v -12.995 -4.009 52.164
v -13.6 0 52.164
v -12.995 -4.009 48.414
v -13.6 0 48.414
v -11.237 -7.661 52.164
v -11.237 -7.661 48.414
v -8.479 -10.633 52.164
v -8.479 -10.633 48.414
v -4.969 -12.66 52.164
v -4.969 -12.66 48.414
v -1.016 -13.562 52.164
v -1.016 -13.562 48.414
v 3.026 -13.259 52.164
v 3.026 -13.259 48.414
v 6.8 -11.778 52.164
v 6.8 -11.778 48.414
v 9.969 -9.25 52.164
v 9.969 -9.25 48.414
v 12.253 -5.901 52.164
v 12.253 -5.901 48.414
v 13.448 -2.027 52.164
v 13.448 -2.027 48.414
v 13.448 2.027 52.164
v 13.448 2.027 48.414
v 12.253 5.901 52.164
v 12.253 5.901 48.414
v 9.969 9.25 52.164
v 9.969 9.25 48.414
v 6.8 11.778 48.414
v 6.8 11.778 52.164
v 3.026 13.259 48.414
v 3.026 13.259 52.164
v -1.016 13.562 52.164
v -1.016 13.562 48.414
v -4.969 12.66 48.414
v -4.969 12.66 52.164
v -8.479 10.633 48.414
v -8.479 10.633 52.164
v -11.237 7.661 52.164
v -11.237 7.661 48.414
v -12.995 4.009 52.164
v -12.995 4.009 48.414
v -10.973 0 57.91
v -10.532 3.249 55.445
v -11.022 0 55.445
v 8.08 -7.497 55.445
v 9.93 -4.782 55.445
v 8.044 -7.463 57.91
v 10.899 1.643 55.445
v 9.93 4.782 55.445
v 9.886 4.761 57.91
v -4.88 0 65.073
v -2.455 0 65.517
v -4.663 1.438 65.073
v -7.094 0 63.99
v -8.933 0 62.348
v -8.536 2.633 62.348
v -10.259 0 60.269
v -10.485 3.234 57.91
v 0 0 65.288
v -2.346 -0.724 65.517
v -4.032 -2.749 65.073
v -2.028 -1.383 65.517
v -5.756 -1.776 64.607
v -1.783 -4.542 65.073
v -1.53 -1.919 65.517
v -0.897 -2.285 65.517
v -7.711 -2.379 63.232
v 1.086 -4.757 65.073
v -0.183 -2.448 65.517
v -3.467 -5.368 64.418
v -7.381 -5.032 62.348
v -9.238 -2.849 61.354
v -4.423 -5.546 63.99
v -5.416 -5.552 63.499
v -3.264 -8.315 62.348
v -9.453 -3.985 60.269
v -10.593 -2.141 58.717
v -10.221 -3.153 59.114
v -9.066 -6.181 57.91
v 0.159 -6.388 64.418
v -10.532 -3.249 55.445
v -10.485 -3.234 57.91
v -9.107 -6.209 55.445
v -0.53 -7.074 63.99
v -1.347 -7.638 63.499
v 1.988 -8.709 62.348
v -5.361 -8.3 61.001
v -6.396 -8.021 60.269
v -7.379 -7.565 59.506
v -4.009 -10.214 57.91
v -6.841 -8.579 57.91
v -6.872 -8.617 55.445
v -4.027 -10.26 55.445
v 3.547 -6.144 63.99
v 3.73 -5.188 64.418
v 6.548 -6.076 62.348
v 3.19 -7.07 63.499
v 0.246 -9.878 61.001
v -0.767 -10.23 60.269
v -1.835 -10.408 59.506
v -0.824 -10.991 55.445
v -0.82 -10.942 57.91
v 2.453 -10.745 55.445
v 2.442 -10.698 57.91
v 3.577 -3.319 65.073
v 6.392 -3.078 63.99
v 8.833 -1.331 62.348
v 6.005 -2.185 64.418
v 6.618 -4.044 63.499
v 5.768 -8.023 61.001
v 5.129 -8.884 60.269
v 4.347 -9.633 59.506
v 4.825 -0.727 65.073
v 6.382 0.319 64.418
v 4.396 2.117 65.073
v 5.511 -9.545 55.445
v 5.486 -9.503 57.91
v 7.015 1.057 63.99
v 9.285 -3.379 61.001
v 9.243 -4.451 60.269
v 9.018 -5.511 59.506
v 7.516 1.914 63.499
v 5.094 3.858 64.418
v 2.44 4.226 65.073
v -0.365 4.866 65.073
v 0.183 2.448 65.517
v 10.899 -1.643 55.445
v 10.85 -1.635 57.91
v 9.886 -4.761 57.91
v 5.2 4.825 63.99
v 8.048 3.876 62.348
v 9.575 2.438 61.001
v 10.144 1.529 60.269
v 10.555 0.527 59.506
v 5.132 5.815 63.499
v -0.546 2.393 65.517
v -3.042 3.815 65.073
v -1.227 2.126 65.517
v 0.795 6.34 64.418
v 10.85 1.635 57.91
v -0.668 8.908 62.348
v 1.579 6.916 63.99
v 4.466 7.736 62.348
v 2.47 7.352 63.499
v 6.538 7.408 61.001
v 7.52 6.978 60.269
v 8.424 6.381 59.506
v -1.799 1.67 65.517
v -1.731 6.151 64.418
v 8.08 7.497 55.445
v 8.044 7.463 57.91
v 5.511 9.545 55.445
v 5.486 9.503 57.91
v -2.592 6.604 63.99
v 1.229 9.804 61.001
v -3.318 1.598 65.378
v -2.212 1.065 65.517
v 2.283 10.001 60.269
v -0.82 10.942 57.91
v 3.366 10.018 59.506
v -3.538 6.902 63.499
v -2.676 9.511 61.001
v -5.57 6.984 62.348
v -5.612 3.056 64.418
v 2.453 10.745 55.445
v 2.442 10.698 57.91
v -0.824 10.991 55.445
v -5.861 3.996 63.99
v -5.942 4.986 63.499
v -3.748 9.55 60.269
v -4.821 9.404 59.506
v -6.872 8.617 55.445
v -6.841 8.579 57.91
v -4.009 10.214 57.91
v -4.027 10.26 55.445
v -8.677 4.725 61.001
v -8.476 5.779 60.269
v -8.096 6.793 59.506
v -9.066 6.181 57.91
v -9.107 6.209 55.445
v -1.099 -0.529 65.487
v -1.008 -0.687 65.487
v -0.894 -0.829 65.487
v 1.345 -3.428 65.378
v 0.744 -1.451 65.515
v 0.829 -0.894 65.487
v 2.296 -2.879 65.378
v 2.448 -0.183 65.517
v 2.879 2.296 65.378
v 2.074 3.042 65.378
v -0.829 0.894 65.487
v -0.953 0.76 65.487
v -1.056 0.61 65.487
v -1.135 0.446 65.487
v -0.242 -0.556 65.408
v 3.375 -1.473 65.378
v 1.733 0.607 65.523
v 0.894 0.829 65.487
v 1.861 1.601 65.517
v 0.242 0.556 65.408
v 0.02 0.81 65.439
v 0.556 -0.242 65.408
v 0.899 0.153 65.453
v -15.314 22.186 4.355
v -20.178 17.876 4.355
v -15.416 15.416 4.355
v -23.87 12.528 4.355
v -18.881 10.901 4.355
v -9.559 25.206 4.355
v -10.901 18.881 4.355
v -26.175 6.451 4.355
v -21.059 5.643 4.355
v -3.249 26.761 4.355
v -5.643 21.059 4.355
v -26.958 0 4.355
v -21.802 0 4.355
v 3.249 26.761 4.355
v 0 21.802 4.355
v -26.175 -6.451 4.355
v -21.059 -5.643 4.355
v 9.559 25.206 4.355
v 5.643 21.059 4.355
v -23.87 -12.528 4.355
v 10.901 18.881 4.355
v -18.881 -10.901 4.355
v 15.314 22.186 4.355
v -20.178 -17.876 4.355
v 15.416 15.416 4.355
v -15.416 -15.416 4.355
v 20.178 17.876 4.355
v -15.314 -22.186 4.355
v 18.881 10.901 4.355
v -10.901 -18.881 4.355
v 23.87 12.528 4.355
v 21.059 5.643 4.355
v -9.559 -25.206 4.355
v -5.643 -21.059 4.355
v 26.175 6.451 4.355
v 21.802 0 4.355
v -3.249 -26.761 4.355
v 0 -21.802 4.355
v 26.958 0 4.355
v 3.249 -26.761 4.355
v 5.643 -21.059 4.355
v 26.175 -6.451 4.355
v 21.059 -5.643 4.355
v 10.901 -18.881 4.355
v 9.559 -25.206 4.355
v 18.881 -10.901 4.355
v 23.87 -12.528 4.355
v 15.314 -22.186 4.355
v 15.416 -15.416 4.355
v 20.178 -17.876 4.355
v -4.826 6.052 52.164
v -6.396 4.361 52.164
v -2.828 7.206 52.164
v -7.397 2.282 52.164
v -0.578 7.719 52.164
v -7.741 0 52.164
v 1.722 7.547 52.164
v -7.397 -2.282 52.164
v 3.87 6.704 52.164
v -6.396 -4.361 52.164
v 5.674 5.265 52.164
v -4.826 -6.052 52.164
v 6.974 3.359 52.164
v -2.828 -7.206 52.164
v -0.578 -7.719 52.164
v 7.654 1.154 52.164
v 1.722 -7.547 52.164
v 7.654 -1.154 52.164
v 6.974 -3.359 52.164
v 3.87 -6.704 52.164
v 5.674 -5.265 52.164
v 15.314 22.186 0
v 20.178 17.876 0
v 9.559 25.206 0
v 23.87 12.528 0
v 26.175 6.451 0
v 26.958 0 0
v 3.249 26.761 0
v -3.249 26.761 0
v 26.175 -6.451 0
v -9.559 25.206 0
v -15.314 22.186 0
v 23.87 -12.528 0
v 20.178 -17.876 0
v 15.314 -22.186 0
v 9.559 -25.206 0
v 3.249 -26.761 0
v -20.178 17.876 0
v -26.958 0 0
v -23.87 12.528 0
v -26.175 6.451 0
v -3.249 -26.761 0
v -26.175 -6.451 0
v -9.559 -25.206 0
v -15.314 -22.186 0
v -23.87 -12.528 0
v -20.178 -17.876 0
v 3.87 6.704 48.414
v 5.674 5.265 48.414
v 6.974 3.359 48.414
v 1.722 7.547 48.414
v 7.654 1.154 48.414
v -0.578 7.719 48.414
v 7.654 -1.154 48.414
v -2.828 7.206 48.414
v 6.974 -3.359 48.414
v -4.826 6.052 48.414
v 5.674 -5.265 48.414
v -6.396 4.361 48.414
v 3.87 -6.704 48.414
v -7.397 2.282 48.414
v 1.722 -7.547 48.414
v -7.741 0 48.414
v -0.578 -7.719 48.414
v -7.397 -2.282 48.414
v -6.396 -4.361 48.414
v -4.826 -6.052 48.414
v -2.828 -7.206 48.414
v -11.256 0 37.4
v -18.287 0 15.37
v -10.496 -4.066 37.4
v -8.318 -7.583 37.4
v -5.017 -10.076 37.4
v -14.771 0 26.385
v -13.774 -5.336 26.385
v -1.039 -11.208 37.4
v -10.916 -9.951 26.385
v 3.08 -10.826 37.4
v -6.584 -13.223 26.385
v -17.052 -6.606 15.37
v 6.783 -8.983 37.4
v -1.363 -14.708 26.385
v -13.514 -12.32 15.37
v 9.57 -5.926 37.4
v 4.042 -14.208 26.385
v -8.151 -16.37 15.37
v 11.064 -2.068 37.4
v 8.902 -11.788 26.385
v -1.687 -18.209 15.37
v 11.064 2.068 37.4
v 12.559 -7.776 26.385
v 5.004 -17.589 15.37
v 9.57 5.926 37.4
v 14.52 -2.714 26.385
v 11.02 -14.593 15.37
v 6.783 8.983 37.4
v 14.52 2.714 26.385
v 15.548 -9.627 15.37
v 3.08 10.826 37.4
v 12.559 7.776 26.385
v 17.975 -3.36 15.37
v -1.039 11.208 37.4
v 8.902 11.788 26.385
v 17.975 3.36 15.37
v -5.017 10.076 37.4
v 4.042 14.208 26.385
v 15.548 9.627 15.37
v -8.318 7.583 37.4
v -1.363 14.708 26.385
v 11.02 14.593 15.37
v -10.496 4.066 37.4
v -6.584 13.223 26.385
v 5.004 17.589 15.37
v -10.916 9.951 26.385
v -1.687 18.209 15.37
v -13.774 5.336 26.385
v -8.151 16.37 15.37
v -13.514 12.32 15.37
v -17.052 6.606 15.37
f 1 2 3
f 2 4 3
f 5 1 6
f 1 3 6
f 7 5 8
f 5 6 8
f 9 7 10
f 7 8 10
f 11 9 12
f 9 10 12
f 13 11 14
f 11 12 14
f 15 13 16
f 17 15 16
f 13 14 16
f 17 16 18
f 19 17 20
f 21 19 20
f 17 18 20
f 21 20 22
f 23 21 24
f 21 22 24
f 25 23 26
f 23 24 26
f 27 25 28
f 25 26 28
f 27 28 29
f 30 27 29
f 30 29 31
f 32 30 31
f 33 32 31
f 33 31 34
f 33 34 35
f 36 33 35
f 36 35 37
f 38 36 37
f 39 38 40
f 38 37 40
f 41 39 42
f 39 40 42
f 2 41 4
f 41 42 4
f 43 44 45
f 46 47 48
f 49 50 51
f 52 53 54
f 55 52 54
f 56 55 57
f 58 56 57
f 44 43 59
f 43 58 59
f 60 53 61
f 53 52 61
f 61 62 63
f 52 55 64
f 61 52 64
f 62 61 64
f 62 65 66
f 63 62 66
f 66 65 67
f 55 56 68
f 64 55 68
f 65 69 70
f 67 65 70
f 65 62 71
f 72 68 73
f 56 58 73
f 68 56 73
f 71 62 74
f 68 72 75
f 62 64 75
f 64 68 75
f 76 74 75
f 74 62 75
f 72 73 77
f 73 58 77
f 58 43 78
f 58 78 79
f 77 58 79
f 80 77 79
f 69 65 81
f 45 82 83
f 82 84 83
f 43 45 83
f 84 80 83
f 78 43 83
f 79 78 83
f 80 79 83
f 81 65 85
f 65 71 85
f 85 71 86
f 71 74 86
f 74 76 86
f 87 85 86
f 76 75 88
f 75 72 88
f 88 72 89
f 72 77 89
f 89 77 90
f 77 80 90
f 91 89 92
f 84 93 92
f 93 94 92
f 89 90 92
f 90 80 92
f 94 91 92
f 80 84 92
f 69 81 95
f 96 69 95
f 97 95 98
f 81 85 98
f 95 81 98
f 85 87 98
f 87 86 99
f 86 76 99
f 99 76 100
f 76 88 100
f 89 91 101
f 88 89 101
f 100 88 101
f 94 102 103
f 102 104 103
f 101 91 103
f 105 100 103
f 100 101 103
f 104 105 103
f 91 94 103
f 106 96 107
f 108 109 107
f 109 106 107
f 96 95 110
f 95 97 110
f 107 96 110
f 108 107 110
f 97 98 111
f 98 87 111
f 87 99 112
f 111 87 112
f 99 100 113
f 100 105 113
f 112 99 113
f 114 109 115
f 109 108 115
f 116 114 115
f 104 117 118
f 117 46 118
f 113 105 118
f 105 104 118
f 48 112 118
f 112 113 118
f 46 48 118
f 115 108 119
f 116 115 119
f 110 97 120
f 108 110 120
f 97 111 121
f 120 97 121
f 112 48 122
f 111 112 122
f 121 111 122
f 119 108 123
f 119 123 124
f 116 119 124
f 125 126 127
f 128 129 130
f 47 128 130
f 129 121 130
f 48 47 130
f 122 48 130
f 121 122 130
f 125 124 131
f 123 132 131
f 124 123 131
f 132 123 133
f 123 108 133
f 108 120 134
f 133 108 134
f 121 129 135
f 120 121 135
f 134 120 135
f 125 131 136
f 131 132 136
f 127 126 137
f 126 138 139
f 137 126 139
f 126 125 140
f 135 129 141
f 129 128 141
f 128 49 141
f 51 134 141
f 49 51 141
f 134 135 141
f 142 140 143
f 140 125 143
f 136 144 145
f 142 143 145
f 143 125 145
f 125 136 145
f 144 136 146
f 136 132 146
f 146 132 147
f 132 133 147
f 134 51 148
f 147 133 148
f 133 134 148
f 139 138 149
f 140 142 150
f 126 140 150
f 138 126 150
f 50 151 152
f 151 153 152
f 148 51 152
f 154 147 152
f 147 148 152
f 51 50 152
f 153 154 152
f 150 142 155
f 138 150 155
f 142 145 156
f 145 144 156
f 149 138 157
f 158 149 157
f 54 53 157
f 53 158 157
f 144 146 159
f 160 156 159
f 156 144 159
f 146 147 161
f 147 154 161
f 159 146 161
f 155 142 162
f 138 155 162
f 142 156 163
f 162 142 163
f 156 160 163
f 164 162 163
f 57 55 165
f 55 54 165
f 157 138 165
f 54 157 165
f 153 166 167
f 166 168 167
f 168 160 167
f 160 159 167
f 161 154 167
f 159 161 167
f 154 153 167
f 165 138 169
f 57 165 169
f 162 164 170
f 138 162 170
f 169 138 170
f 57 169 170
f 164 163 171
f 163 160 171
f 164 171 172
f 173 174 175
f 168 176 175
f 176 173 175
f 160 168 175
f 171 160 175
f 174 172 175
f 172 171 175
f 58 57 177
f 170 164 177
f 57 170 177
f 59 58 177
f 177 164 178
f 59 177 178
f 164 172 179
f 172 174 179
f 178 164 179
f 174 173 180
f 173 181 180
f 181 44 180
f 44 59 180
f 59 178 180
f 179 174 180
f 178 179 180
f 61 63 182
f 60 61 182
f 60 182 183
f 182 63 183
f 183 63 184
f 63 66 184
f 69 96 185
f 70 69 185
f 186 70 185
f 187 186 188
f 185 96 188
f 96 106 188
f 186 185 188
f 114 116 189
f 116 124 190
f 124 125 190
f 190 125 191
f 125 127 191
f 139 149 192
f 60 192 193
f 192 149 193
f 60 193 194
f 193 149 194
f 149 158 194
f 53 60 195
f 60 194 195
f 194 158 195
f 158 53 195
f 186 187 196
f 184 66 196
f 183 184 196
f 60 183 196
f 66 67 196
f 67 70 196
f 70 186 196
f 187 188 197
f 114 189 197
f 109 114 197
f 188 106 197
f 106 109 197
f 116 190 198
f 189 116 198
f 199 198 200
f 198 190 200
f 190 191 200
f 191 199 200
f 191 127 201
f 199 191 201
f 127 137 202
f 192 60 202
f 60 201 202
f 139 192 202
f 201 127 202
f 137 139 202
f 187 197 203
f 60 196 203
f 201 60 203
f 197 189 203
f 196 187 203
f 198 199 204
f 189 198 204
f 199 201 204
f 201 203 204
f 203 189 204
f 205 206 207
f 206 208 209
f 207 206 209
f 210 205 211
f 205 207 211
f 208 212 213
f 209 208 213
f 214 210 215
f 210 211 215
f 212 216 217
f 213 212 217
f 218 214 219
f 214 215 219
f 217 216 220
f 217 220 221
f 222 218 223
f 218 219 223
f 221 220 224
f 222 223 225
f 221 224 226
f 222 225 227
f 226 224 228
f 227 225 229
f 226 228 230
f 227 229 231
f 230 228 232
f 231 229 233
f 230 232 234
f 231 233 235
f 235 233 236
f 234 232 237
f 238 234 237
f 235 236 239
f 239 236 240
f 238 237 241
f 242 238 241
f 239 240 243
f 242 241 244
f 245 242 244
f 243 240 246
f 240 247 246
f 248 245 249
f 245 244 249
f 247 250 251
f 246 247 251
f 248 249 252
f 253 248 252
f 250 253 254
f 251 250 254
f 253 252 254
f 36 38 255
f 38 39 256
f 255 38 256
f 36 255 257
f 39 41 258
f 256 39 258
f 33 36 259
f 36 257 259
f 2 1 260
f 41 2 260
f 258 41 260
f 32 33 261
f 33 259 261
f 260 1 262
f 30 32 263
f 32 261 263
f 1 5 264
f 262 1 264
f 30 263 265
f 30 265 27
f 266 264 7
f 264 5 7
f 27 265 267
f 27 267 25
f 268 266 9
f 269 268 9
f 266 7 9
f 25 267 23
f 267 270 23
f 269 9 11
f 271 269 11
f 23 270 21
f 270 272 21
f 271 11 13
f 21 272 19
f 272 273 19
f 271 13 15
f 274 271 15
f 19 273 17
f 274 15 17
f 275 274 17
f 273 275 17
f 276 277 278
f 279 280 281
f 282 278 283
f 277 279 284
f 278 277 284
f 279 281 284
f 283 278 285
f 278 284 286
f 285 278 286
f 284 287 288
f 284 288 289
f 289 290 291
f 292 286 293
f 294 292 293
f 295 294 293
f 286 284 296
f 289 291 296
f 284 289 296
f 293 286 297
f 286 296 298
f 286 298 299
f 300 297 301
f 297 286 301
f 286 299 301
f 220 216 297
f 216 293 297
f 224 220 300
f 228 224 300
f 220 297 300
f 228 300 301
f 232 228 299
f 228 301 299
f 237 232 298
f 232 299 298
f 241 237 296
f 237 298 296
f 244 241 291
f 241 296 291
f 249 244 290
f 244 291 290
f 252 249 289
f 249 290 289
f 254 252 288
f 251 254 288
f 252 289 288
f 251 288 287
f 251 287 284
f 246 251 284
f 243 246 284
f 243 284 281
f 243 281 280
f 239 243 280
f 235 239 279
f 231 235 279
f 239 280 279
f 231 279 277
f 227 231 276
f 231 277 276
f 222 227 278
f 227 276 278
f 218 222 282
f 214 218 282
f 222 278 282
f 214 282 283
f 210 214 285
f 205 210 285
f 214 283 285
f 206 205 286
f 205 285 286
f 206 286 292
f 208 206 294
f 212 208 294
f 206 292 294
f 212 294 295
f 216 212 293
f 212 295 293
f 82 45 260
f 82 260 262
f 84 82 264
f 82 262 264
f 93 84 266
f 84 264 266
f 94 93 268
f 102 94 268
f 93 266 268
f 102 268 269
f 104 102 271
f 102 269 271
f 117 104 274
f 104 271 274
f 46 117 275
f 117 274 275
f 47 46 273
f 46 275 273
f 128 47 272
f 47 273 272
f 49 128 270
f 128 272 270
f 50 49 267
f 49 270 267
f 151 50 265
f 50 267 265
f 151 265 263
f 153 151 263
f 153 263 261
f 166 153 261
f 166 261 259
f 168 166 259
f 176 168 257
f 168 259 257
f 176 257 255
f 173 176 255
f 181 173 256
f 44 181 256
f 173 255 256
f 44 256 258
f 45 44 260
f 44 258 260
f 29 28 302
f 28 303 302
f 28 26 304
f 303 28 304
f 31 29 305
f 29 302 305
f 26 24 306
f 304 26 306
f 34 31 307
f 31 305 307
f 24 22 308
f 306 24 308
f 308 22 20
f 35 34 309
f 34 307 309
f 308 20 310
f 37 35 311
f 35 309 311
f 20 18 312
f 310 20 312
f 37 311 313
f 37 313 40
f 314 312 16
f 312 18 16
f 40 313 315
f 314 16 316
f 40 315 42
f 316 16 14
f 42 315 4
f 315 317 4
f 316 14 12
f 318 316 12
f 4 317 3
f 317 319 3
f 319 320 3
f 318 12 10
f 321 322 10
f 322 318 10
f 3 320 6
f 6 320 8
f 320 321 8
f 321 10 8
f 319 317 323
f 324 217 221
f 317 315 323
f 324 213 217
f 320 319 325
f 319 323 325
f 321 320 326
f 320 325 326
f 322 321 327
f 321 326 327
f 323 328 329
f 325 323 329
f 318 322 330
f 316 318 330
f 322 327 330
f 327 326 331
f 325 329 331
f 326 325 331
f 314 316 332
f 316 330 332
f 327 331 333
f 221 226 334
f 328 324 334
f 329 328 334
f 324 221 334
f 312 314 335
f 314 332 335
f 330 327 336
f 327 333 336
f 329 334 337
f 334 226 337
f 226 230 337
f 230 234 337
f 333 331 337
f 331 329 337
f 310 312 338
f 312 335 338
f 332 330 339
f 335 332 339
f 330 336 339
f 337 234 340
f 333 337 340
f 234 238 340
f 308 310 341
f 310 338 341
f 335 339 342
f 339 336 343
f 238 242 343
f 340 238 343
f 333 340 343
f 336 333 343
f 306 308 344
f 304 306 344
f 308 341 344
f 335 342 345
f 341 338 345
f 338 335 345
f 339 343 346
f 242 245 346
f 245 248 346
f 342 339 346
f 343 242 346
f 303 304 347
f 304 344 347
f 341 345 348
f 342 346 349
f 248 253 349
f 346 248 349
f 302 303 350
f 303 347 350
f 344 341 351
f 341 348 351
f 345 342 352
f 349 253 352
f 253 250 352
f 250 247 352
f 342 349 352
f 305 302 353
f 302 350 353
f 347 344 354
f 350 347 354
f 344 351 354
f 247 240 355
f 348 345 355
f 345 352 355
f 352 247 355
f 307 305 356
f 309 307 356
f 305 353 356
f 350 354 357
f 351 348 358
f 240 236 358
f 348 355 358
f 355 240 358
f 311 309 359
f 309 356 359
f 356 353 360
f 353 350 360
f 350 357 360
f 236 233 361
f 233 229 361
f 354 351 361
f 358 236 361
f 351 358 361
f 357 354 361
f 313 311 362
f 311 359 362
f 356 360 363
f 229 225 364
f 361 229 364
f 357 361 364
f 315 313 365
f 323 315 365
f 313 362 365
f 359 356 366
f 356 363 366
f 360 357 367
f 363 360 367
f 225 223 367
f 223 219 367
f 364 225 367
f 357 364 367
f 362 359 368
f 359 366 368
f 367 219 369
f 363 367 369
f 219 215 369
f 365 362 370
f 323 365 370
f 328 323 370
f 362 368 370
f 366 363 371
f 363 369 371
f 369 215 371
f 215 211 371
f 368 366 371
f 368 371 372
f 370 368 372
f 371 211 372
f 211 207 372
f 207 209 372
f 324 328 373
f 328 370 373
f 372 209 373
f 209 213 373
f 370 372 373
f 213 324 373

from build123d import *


with BuildPart() as f1:
    # F0 (on Front) → F1 (revolve)
    with BuildSketch(Plane.XZ):
        with BuildLine():
            Line((-26.957957, 0), (0, 0))
            Line((0, 0), (0, 65.287866))
            ThreePointArc((0, 65.287866), (-8.069751, 63.231719), (-11.021761, 55.444919))
            Line((-11.021761, 55.444919), (-7.740781, 52.16394))
            Line((-7.740781, 52.16394), (-13.599676, 52.16394))
            Line((-13.599676, 52.16394), (-13.599676, 48.414249))
            Line((-13.599676, 48.414249), (-7.740781, 48.414249))
            Line((-7.740781, 48.414249), (-21.802129, 4.355352))
            Line((-21.802129, 4.355352), (-26.957957, 4.355352))
            Line((-26.957957, 4.355352), (-26.957957, 0))
        make_face()
    revolve(axis=Axis((0, 0, 32.643933), (0, 0, 1)))


solid = f1.part
